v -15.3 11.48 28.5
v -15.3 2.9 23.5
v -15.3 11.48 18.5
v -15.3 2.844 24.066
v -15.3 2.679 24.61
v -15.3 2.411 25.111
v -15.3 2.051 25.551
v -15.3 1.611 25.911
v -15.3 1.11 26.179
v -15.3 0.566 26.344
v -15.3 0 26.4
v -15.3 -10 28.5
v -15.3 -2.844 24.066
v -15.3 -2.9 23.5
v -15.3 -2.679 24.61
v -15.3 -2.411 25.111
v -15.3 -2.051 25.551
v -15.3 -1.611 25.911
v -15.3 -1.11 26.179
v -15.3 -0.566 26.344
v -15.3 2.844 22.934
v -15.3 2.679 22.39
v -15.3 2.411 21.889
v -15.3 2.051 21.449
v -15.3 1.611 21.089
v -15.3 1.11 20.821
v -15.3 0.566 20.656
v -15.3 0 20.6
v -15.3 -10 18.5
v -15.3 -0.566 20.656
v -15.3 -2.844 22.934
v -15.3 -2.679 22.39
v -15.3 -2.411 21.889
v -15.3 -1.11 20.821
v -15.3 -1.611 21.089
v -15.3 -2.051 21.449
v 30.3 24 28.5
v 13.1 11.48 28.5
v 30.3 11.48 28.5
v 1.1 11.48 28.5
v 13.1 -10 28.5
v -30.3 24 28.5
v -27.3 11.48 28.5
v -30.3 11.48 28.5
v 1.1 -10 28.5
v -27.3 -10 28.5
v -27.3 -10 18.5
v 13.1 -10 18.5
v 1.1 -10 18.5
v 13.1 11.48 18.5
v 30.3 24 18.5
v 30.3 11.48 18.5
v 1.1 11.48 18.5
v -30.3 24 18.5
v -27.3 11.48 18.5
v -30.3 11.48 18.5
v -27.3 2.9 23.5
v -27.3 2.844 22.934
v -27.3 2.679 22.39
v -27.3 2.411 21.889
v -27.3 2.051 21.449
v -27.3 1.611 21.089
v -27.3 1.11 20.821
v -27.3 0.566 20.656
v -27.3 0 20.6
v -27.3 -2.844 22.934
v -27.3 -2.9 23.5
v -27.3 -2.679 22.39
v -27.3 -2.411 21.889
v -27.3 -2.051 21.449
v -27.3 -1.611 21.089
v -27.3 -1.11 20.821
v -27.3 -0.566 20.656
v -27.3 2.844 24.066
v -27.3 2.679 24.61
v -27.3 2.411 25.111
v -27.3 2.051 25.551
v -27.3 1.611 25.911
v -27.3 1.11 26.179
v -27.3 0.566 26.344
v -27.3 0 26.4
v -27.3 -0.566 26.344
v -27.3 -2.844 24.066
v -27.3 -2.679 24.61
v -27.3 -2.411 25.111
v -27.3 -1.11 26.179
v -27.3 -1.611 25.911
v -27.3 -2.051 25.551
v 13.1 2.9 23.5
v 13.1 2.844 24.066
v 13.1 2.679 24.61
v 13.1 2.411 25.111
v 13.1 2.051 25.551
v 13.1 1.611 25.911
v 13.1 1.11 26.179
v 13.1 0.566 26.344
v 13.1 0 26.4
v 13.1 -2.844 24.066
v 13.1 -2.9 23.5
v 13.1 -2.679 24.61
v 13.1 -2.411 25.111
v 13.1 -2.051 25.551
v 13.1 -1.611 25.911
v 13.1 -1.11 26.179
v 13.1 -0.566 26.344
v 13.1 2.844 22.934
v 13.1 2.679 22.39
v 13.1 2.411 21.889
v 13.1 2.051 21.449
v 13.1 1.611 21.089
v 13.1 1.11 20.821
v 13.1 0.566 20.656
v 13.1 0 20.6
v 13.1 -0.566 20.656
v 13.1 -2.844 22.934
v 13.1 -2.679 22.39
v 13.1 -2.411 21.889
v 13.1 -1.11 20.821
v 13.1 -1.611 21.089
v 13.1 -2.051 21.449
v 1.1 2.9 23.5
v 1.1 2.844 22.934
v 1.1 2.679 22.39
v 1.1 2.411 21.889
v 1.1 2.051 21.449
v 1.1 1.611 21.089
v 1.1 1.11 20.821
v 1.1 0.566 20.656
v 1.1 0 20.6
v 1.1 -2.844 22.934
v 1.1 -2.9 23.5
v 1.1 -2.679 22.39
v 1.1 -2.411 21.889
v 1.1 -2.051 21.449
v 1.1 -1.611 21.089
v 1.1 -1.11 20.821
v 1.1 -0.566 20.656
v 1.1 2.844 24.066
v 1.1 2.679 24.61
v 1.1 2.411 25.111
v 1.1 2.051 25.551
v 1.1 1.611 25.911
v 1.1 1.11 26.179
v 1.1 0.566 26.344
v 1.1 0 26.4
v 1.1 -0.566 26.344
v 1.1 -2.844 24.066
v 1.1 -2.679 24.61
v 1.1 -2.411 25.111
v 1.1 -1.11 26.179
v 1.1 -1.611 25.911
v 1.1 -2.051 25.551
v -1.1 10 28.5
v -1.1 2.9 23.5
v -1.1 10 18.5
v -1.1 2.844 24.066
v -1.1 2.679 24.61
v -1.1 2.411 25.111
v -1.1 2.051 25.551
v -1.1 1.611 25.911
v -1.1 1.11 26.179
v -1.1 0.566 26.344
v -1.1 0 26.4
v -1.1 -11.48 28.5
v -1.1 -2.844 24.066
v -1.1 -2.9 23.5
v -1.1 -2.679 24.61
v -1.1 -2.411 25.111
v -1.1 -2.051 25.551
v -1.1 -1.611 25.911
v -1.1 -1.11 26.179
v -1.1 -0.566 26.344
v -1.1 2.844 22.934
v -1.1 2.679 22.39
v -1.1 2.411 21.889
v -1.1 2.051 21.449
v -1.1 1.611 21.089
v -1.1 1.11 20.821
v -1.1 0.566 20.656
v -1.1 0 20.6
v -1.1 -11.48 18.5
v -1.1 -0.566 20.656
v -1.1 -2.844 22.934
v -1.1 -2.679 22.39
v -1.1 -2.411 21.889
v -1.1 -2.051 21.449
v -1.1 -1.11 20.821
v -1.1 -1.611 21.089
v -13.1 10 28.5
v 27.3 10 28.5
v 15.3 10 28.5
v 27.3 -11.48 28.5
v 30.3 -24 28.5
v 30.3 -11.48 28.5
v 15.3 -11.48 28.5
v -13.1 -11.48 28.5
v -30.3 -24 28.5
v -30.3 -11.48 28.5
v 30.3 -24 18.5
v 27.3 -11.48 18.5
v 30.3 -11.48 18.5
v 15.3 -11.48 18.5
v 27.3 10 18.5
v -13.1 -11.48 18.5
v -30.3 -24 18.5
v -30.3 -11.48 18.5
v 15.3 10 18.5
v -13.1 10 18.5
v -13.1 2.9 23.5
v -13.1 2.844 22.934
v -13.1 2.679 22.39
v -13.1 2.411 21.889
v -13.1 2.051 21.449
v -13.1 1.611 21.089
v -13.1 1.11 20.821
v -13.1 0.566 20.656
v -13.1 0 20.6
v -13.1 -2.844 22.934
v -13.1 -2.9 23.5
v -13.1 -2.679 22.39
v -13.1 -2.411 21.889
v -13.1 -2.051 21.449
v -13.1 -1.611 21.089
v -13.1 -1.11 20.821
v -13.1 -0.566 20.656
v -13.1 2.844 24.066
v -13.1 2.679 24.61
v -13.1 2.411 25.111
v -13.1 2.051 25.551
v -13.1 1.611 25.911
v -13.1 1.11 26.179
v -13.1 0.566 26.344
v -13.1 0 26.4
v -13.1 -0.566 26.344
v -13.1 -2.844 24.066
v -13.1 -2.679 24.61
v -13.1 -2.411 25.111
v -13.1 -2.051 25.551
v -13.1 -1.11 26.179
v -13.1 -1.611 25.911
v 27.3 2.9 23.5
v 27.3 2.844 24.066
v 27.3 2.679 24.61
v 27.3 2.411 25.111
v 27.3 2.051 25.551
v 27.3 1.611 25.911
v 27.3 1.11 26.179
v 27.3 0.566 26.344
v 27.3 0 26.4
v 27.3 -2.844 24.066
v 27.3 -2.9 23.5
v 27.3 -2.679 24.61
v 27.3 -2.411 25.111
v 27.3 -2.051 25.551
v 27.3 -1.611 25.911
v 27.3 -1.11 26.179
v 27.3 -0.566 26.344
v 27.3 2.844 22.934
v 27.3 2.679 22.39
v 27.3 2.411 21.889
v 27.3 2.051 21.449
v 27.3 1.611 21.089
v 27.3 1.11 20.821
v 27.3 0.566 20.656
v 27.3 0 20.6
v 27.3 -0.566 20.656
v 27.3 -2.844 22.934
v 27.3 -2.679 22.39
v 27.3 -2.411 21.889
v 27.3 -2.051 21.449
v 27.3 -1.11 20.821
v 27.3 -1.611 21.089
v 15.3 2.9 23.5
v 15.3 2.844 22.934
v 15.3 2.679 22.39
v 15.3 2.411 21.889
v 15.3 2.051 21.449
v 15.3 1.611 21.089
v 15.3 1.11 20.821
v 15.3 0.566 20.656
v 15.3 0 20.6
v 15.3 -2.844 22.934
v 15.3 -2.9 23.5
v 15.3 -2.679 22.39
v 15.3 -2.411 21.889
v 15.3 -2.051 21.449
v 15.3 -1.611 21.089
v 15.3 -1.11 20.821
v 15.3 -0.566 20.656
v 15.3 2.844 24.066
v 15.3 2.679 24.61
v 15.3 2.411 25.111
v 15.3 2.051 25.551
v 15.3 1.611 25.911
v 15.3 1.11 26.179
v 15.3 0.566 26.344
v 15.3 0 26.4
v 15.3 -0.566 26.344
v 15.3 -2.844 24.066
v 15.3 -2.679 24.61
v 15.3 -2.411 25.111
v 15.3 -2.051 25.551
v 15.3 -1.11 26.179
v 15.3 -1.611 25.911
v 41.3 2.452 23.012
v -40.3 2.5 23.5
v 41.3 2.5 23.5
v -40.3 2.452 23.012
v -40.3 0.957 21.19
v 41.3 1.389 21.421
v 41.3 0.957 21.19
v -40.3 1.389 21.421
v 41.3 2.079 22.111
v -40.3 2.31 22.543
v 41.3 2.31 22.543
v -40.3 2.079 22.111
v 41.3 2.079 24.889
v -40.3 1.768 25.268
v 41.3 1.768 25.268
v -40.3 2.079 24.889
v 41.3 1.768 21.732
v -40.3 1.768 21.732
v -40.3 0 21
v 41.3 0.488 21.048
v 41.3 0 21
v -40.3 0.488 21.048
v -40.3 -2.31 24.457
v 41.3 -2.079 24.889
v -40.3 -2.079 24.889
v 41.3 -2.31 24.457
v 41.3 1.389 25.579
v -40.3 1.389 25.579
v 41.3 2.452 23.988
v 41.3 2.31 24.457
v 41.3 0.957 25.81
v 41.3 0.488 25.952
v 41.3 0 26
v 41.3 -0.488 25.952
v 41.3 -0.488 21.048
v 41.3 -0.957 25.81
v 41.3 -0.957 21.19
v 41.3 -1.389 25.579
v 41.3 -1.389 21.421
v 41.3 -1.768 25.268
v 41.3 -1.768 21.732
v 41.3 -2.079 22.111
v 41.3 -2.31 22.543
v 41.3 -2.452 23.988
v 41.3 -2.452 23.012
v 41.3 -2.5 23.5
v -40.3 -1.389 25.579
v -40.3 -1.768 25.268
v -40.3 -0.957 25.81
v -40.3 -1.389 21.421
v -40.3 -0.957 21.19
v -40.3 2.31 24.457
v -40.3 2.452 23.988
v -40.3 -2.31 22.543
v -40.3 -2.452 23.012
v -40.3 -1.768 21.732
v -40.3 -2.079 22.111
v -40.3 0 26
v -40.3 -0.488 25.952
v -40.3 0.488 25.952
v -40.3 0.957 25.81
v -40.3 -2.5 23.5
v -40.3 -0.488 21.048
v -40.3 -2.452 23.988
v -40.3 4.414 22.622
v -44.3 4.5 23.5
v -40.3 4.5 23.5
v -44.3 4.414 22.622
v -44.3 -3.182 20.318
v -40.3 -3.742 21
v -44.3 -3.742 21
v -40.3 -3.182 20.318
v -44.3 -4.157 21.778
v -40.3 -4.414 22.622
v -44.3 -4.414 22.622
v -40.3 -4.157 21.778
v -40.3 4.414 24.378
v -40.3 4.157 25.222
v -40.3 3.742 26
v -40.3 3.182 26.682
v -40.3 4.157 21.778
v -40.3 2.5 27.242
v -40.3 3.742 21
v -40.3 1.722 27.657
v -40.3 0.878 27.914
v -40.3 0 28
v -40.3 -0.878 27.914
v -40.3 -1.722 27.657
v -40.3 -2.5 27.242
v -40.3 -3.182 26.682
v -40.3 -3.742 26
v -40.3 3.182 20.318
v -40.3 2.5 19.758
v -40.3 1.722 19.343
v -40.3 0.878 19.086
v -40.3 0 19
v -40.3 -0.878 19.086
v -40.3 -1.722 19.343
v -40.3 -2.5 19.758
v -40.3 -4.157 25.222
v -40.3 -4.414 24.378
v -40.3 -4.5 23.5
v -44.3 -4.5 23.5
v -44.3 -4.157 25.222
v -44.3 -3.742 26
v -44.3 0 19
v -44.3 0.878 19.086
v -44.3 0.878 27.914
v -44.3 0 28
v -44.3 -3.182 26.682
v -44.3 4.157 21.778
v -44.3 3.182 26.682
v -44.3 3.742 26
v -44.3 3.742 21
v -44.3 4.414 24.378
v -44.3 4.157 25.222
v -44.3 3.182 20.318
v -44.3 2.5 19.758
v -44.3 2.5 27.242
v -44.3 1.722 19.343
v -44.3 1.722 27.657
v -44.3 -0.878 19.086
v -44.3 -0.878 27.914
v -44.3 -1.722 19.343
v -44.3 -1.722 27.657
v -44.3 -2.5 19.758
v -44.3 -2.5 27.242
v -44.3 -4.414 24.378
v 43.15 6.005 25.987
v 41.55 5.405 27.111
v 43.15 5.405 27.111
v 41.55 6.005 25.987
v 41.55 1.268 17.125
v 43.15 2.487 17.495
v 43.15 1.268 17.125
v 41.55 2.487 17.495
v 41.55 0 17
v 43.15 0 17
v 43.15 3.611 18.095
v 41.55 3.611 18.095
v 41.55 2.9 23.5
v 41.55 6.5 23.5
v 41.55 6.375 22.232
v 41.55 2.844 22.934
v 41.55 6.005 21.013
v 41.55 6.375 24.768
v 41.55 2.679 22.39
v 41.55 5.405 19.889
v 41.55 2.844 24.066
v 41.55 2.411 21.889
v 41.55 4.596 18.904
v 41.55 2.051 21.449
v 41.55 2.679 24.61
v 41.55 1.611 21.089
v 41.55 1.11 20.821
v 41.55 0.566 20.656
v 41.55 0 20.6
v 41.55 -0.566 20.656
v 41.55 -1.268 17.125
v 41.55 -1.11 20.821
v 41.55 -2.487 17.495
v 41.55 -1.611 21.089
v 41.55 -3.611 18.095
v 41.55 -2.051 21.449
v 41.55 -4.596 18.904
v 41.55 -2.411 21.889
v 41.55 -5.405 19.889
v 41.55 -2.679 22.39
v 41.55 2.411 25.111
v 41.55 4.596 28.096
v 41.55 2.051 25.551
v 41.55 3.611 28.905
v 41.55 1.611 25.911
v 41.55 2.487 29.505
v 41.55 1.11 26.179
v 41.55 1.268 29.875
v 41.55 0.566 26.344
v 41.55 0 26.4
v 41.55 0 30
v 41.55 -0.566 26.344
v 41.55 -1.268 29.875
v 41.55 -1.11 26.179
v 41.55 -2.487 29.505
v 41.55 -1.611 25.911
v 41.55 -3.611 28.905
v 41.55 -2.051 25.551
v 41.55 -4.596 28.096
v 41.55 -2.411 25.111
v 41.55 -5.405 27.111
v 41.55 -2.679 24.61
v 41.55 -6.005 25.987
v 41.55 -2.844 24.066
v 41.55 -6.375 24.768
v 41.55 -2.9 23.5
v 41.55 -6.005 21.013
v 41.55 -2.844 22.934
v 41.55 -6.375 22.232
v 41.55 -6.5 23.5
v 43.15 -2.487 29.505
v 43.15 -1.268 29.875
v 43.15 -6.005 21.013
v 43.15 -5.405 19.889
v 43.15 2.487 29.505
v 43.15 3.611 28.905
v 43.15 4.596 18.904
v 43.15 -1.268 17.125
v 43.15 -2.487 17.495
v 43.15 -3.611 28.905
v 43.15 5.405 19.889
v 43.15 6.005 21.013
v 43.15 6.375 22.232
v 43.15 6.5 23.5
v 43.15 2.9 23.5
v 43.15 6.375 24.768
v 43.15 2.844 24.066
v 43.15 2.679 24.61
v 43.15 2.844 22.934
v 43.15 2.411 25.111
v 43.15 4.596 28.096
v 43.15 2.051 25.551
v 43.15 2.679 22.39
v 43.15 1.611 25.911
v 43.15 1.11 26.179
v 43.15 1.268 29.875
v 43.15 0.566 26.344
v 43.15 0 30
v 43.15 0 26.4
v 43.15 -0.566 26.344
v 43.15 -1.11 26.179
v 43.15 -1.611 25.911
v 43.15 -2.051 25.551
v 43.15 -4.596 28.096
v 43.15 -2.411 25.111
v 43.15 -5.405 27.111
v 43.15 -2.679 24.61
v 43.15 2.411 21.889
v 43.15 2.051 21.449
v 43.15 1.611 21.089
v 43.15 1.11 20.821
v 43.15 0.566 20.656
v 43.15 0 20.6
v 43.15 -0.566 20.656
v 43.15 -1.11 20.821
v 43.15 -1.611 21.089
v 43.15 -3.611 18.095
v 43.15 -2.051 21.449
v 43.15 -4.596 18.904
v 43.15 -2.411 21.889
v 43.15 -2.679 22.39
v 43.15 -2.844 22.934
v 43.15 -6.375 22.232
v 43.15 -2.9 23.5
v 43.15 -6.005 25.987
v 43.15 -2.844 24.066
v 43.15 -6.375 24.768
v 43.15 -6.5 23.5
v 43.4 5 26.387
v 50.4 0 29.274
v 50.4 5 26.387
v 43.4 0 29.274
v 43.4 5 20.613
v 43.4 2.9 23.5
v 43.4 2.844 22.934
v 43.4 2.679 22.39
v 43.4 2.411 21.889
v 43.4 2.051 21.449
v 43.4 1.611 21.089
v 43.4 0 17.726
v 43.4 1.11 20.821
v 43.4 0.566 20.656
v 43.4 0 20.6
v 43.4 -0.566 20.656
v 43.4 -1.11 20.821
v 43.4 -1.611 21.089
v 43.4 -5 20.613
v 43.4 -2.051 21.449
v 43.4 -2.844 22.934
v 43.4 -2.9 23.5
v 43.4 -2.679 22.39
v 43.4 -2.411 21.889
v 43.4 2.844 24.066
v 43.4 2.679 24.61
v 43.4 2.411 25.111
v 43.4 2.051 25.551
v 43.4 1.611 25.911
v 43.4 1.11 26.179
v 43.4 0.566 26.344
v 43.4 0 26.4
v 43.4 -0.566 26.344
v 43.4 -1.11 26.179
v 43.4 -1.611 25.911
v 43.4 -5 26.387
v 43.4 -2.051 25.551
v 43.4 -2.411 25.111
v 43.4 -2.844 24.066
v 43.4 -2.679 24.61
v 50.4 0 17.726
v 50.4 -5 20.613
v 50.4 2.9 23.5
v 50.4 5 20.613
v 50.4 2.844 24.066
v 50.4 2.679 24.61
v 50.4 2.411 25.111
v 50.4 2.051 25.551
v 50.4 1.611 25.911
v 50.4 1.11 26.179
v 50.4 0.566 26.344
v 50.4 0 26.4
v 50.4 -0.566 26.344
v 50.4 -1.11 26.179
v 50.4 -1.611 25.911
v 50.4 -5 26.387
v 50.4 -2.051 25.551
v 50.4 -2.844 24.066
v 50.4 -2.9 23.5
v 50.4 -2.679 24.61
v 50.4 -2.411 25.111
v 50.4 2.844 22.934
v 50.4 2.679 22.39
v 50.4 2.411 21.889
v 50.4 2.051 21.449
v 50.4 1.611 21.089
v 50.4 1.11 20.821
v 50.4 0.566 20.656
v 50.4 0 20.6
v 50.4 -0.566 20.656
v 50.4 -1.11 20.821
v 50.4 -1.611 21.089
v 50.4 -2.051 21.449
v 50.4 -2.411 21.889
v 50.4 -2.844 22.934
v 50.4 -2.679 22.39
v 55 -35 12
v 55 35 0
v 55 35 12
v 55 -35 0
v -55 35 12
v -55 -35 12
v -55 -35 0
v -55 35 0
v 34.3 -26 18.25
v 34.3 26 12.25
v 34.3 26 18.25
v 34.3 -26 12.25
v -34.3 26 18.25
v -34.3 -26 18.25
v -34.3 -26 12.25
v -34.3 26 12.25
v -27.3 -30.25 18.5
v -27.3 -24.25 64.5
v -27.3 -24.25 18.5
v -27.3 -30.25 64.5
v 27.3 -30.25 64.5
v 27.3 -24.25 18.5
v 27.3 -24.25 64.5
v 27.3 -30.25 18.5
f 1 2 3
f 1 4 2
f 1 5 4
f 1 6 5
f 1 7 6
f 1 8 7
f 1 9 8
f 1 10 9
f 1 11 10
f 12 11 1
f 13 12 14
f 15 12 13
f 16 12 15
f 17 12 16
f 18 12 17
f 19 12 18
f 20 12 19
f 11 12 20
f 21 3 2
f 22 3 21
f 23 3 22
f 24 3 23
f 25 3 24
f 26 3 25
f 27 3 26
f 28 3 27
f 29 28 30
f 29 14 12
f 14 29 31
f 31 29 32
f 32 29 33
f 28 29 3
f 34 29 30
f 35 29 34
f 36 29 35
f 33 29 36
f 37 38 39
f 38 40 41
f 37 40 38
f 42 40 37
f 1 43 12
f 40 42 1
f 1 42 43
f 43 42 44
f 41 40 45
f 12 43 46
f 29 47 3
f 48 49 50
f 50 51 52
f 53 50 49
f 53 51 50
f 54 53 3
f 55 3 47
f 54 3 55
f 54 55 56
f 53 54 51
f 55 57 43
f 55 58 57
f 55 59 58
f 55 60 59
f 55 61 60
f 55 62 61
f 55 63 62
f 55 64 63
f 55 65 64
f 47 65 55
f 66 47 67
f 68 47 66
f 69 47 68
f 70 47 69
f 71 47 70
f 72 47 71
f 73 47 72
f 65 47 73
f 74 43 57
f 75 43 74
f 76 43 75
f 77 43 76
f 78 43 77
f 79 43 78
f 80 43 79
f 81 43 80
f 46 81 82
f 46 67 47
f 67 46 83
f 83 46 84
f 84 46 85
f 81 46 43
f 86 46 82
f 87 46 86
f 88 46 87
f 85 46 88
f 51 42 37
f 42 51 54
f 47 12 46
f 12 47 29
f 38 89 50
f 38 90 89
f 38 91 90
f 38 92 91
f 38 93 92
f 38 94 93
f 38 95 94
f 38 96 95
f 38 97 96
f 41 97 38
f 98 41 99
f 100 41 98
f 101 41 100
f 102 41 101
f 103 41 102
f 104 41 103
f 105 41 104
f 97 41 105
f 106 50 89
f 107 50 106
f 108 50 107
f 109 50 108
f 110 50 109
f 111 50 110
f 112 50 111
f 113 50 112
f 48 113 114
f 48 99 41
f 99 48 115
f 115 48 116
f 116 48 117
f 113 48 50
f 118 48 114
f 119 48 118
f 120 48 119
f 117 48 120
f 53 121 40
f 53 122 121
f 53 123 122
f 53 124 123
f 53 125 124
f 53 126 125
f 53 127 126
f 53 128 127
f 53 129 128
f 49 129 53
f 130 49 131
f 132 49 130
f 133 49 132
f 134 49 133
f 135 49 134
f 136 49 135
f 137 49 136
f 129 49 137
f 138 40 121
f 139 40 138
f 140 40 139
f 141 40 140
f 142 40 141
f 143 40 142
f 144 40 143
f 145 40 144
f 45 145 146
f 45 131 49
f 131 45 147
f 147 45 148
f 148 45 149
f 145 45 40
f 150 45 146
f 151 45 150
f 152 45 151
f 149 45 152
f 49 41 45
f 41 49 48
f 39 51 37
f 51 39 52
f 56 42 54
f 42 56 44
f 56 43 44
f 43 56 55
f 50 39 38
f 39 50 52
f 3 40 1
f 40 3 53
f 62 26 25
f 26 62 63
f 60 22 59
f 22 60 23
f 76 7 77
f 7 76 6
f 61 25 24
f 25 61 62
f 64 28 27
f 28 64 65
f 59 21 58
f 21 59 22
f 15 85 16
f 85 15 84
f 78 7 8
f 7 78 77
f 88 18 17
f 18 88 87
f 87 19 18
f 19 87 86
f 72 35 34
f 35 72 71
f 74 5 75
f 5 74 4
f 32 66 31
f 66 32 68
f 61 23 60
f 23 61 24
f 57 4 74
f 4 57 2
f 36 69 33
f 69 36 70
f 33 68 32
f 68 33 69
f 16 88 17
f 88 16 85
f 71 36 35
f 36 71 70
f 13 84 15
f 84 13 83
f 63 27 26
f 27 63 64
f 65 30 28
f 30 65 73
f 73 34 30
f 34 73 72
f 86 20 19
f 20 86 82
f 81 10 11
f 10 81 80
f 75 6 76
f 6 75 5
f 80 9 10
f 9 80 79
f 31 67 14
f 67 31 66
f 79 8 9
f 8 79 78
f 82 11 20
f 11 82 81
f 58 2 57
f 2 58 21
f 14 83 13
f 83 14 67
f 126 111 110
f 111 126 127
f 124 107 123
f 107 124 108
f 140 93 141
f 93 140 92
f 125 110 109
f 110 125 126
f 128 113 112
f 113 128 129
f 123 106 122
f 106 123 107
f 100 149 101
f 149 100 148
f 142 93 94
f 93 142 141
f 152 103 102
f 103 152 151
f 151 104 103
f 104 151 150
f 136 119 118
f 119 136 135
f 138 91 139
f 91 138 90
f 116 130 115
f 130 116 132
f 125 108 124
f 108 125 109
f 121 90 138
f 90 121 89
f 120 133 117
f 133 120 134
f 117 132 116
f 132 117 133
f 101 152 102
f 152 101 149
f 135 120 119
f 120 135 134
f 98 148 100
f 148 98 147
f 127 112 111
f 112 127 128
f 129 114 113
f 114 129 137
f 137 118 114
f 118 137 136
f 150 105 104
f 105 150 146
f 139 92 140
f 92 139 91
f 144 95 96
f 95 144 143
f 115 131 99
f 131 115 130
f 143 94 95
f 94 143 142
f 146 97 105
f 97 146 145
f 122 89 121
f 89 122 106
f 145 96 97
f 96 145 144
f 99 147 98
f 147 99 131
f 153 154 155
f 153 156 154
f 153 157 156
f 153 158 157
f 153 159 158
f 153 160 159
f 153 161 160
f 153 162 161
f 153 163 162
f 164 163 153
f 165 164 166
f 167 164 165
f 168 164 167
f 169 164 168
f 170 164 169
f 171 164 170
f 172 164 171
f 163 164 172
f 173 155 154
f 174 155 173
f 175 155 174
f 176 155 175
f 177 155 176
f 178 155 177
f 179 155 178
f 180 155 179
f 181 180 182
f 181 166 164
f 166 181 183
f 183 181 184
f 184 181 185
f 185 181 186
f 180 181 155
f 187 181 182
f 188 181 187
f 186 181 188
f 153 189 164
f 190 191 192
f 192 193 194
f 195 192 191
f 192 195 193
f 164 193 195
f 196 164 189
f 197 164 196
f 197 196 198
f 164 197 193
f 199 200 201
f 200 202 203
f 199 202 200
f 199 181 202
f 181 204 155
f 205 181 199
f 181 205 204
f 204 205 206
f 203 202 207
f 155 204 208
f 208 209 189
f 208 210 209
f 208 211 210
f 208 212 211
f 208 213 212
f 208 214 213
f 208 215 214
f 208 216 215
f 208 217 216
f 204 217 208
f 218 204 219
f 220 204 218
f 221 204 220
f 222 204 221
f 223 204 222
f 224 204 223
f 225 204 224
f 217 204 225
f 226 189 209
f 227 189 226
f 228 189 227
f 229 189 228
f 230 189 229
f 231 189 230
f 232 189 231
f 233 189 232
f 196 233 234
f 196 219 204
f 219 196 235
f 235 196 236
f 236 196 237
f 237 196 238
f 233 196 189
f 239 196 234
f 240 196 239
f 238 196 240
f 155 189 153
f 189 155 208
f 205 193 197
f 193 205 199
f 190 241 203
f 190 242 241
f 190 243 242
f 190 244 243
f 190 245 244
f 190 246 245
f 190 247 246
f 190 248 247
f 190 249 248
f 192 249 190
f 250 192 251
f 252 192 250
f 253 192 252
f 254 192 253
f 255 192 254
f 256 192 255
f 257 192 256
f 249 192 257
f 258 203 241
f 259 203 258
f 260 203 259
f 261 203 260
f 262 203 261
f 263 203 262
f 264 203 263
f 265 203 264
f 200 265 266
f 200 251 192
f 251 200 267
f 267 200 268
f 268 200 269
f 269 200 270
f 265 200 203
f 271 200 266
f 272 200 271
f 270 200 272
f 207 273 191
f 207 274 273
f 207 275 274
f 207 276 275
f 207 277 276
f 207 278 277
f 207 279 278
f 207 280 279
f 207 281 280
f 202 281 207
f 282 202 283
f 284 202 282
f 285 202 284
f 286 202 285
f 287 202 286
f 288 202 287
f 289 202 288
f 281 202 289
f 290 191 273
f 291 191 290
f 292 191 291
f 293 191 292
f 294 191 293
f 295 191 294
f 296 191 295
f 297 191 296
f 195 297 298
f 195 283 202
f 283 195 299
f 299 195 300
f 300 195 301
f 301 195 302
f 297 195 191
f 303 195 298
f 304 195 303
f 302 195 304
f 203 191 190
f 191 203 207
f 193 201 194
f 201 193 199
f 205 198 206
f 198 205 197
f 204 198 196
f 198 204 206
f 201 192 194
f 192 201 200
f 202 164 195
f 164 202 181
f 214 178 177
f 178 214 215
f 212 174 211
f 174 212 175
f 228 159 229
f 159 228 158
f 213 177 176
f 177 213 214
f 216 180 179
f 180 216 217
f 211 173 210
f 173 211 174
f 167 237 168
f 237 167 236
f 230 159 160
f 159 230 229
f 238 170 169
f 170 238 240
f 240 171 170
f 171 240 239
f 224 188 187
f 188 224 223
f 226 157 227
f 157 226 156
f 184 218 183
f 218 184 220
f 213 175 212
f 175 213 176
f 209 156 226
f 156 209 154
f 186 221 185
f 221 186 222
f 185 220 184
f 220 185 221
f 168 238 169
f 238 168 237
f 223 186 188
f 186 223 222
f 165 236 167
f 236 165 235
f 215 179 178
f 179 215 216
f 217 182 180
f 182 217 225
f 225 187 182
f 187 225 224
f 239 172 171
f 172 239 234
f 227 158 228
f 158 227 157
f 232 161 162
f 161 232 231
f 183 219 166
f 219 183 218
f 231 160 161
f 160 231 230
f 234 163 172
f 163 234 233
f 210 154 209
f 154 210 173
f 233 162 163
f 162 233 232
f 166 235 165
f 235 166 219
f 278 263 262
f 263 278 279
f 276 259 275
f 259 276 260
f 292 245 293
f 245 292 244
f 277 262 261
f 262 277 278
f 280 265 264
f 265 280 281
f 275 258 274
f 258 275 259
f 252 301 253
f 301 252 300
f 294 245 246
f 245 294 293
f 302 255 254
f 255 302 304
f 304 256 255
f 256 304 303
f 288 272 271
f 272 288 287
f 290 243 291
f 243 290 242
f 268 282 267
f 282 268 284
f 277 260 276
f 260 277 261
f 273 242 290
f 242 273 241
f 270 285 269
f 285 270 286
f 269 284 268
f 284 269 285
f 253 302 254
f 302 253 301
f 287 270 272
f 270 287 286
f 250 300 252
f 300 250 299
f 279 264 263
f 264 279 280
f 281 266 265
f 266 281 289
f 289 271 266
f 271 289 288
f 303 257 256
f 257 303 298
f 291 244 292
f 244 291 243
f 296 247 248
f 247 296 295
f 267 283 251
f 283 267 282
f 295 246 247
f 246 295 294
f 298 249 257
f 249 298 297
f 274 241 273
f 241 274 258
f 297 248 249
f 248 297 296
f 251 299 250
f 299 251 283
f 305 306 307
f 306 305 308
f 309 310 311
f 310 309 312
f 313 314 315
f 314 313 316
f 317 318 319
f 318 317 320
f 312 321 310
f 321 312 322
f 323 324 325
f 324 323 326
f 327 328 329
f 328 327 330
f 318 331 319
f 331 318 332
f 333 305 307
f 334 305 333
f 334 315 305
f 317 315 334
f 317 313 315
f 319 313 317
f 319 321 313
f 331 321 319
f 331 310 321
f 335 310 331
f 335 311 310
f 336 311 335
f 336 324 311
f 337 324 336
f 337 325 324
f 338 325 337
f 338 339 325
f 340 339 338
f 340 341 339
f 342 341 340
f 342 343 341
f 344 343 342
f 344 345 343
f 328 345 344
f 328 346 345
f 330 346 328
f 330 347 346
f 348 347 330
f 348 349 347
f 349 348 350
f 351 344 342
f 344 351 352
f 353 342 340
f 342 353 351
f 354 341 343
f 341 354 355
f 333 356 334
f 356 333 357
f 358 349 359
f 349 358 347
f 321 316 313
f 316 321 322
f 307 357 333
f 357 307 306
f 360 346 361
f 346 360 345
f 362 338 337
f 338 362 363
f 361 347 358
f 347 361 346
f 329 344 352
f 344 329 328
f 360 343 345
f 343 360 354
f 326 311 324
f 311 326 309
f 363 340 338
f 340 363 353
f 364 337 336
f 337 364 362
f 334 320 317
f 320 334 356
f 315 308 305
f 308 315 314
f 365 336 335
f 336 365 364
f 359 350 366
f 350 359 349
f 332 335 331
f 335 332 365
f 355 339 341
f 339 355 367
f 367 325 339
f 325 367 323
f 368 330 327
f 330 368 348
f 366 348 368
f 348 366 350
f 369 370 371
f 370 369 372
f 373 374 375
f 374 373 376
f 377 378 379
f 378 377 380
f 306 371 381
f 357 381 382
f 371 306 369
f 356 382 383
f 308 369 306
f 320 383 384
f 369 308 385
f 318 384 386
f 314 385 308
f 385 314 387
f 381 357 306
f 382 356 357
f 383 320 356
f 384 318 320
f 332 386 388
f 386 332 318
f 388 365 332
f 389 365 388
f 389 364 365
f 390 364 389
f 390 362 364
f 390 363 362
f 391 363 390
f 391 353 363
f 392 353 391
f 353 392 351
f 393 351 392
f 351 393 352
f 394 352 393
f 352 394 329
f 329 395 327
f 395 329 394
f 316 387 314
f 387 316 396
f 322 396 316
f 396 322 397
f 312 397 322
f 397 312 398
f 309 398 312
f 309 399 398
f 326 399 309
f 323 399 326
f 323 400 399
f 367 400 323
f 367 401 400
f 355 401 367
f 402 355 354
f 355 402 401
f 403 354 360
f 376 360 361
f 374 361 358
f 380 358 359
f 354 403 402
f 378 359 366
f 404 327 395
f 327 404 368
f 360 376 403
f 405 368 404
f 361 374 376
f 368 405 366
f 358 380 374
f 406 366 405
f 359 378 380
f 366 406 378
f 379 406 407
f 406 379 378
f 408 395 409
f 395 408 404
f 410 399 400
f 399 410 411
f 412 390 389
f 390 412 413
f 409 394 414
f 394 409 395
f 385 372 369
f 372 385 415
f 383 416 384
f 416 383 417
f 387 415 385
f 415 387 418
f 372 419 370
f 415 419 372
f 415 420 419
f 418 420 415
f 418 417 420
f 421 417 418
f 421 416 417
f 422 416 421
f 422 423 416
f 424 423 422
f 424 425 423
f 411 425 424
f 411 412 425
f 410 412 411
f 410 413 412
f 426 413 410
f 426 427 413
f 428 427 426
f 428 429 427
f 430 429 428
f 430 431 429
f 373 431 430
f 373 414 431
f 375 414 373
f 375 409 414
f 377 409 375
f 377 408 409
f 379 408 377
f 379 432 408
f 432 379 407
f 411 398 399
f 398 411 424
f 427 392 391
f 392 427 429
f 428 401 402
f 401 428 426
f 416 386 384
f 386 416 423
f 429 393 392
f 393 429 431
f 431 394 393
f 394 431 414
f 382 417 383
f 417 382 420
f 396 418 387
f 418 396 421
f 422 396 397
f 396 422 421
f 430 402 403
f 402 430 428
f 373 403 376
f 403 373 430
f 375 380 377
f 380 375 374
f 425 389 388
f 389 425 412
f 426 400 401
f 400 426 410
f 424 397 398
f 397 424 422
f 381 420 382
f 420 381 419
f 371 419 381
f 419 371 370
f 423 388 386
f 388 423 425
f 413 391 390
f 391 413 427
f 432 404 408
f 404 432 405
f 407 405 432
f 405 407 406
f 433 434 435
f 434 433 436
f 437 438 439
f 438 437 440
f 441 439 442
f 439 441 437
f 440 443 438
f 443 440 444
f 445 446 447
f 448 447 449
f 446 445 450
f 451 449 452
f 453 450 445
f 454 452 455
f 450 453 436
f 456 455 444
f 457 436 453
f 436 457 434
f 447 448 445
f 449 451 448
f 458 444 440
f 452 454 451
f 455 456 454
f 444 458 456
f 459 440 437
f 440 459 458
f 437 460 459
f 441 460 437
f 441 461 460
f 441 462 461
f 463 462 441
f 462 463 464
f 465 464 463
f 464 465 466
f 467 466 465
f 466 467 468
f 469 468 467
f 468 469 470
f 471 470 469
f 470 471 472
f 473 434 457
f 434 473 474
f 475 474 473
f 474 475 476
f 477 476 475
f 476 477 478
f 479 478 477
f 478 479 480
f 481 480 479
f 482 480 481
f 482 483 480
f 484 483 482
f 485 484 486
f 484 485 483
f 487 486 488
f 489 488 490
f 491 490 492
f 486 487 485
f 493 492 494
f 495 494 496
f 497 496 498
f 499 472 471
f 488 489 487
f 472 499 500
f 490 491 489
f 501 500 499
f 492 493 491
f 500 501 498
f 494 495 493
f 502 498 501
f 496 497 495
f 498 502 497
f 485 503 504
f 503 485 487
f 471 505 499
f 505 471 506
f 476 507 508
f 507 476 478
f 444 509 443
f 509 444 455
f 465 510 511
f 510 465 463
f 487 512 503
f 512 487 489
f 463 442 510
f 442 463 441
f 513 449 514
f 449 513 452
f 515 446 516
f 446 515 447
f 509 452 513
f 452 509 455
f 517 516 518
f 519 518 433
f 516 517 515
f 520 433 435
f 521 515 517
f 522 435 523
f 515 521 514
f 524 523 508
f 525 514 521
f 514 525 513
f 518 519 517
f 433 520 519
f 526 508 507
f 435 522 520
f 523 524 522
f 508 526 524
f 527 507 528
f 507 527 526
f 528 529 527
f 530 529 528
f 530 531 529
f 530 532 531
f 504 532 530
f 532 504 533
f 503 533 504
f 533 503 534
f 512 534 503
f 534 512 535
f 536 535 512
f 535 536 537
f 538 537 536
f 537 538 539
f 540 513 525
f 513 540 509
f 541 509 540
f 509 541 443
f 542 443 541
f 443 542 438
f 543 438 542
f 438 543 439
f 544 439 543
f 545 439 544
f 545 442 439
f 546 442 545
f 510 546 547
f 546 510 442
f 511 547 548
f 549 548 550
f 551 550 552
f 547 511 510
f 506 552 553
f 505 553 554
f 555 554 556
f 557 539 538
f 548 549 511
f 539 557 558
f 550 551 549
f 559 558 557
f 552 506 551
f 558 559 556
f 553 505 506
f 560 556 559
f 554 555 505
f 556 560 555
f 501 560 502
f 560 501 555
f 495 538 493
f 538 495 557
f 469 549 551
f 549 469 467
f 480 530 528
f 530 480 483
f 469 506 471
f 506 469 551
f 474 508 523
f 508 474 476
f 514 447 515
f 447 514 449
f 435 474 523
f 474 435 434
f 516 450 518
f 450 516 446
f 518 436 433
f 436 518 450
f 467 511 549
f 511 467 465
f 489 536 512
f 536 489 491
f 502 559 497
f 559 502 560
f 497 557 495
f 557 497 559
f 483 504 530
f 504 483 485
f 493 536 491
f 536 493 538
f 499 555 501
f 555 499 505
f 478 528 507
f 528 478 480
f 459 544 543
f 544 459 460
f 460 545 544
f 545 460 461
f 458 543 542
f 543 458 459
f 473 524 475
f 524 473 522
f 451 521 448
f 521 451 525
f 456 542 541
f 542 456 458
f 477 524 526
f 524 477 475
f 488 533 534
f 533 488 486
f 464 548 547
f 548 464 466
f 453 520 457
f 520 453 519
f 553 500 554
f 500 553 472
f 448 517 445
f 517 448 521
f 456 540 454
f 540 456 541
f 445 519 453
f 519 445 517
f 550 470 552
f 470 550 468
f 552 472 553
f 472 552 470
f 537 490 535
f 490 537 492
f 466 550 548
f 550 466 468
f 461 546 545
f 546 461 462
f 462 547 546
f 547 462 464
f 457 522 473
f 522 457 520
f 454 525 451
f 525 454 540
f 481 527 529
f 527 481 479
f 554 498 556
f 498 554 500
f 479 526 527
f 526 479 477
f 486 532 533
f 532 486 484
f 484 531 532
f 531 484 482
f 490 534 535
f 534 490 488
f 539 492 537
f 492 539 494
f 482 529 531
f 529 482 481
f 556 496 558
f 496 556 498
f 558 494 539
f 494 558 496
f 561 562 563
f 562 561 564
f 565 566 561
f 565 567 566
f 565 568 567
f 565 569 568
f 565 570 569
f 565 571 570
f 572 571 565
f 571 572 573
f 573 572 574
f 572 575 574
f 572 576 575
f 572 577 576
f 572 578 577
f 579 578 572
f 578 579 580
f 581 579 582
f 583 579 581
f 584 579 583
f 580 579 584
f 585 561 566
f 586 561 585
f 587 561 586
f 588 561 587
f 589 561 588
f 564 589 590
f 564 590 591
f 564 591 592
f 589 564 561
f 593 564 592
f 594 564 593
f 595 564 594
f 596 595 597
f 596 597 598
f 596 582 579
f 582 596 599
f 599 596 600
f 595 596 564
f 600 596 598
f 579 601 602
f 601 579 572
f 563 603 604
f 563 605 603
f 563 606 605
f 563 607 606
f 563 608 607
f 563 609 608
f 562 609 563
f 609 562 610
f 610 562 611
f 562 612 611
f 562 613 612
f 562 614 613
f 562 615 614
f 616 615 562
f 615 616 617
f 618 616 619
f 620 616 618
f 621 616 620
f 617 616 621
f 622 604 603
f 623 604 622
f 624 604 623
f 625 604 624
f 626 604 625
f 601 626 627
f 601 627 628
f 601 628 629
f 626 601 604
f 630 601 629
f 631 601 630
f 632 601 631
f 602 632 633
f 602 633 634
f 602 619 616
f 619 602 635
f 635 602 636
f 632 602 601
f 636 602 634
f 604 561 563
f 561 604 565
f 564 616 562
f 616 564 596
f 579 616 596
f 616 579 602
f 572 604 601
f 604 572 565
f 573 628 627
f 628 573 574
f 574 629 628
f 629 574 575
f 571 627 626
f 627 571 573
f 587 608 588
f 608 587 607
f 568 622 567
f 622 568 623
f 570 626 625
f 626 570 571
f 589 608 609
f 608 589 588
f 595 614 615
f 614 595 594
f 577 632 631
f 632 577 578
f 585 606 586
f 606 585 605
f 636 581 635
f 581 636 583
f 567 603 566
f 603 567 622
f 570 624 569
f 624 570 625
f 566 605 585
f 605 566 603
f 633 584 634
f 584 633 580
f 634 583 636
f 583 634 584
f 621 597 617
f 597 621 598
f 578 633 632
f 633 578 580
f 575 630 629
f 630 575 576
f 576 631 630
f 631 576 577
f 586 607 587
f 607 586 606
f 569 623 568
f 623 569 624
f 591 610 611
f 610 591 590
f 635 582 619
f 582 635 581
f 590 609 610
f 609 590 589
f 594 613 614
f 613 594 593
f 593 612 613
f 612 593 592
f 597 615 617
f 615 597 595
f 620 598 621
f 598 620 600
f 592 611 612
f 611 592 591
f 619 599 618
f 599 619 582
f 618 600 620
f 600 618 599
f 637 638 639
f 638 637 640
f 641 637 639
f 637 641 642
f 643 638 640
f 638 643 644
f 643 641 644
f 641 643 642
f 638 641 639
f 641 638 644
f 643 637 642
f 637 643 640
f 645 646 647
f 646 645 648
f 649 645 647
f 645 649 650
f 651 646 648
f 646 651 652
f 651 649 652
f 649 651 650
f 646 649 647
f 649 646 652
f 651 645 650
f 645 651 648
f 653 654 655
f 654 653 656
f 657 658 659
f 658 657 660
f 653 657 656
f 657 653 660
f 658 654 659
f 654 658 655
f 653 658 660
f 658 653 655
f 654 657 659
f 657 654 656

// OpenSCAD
$fn = 32;

// ------------------------------------------------------------------------
// Comb hinge with flap: leaf 60.6 x 24 mm, pin d5, flap 46 mm
// Every part is its own module, assembly() places every instance.
// ------------------------------------------------------------------------

// --- part 1 ---
module hinge_bed() {
  difference() {
    translate([-55, -35, 0]) cube([110, 70, 12]);
  }
}

// --- part 2 ---
module hinge_riser() {
  difference() {
    translate([-34.3, -26, 0]) cube([68.6, 52, 6]);
  }
}

// --- part 3 ---
module hinge_leaf_a() {
  difference() {
    union() {
      translate([-27.3, -10, -5]) cube([12, 34, 10]);
      translate([1.1, -10, -5]) cube([12, 34, 10]);
      translate([-30.3, 11.48, -5]) cube([60.6, 12.52, 10]);
    }
    translate([-21.3, 0, 0]) rotate([0, 90, 0]) cylinder(h = 14, d = 5.8, center = true);
    translate([7.1, 0, 0]) rotate([0, 90, 0]) cylinder(h = 14, d = 5.8, center = true);
  }
}

// --- part 4 ---
module hinge_leaf_b() {
  difference() {
    union() {
      translate([-13.1, -24, -5]) cube([12, 34, 10]);
      translate([15.3, -24, -5]) cube([12, 34, 10]);
      translate([-30.3, -24, -5]) cube([60.6, 12.52, 10]);
    }
    translate([-7.1, 0, 0]) rotate([0, 90, 0]) cylinder(h = 14, d = 5.8, center = true);
    translate([21.3, 0, 0]) rotate([0, 90, 0]) cylinder(h = 14, d = 5.8, center = true);
  }
}

// --- part 5 ---
module hinge_flap() {
  difference() {
    translate([-27.3, -23, 0]) cube([54.6, 46, 6]);
  }
}

// --- part 6 ---
module hinge_pin() {
  rotate([0, 90, 0]) cylinder(h = 82.6, d = 5, center = true);
  translate([-44.3, 0, 0]) rotate([0, 90, 0]) cylinder(h = 4, d = 9);
}

// --- part 7 ---
module pin_washer() {
  difference() {
      translate([0, 0, 0]) cylinder(h = 1.6, d = 13);
      translate([0, 0, -1]) cylinder(h = 3.6, d = 5.8);
    }
}

// --- part 8 ---
module pin_nut() {
  difference() {
    linear_extrude(height = 7) polygon(points = [[5.774, 0], [2.887, 5], [-2.887, 5], [-5.774, 0], [-2.887, -5], [2.887, -5]]);
    translate([0, 0, -1]) cylinder(h = 9, d = 5.8);
  }
}

// --- assembly ---
module assembly() {
  color([0.80, 0.24, 0.20]) translate([0, 0, 0]) rotate([0, 0, 0]) hinge_bed();
  color([0.20, 0.45, 0.75]) translate([0, 0, 12.25]) rotate([0, 0, 0]) hinge_riser();
  color([0.25, 0.62, 0.32]) translate([0, 0, 23.5]) rotate([0, 0, 0]) hinge_leaf_a();
  color([0.92, 0.70, 0.18]) translate([0, 0, 23.5]) rotate([0, 0, 0]) hinge_leaf_b();
  color([0.58, 0.35, 0.70]) translate([0, -24.25, 41.5]) rotate([90, 0, 0]) hinge_flap();
  color([0.16, 0.66, 0.66]) translate([0, 0, 23.5]) rotate([0, 0, 0]) hinge_pin();
  color([0.85, 0.48, 0.18]) translate([41.55, 0, 23.5]) rotate([0, 90, 0]) pin_washer();
  color([0.55, 0.60, 0.65]) translate([43.4, 0, 23.5]) rotate([0, 90, 0]) pin_nut();
}

assembly();
